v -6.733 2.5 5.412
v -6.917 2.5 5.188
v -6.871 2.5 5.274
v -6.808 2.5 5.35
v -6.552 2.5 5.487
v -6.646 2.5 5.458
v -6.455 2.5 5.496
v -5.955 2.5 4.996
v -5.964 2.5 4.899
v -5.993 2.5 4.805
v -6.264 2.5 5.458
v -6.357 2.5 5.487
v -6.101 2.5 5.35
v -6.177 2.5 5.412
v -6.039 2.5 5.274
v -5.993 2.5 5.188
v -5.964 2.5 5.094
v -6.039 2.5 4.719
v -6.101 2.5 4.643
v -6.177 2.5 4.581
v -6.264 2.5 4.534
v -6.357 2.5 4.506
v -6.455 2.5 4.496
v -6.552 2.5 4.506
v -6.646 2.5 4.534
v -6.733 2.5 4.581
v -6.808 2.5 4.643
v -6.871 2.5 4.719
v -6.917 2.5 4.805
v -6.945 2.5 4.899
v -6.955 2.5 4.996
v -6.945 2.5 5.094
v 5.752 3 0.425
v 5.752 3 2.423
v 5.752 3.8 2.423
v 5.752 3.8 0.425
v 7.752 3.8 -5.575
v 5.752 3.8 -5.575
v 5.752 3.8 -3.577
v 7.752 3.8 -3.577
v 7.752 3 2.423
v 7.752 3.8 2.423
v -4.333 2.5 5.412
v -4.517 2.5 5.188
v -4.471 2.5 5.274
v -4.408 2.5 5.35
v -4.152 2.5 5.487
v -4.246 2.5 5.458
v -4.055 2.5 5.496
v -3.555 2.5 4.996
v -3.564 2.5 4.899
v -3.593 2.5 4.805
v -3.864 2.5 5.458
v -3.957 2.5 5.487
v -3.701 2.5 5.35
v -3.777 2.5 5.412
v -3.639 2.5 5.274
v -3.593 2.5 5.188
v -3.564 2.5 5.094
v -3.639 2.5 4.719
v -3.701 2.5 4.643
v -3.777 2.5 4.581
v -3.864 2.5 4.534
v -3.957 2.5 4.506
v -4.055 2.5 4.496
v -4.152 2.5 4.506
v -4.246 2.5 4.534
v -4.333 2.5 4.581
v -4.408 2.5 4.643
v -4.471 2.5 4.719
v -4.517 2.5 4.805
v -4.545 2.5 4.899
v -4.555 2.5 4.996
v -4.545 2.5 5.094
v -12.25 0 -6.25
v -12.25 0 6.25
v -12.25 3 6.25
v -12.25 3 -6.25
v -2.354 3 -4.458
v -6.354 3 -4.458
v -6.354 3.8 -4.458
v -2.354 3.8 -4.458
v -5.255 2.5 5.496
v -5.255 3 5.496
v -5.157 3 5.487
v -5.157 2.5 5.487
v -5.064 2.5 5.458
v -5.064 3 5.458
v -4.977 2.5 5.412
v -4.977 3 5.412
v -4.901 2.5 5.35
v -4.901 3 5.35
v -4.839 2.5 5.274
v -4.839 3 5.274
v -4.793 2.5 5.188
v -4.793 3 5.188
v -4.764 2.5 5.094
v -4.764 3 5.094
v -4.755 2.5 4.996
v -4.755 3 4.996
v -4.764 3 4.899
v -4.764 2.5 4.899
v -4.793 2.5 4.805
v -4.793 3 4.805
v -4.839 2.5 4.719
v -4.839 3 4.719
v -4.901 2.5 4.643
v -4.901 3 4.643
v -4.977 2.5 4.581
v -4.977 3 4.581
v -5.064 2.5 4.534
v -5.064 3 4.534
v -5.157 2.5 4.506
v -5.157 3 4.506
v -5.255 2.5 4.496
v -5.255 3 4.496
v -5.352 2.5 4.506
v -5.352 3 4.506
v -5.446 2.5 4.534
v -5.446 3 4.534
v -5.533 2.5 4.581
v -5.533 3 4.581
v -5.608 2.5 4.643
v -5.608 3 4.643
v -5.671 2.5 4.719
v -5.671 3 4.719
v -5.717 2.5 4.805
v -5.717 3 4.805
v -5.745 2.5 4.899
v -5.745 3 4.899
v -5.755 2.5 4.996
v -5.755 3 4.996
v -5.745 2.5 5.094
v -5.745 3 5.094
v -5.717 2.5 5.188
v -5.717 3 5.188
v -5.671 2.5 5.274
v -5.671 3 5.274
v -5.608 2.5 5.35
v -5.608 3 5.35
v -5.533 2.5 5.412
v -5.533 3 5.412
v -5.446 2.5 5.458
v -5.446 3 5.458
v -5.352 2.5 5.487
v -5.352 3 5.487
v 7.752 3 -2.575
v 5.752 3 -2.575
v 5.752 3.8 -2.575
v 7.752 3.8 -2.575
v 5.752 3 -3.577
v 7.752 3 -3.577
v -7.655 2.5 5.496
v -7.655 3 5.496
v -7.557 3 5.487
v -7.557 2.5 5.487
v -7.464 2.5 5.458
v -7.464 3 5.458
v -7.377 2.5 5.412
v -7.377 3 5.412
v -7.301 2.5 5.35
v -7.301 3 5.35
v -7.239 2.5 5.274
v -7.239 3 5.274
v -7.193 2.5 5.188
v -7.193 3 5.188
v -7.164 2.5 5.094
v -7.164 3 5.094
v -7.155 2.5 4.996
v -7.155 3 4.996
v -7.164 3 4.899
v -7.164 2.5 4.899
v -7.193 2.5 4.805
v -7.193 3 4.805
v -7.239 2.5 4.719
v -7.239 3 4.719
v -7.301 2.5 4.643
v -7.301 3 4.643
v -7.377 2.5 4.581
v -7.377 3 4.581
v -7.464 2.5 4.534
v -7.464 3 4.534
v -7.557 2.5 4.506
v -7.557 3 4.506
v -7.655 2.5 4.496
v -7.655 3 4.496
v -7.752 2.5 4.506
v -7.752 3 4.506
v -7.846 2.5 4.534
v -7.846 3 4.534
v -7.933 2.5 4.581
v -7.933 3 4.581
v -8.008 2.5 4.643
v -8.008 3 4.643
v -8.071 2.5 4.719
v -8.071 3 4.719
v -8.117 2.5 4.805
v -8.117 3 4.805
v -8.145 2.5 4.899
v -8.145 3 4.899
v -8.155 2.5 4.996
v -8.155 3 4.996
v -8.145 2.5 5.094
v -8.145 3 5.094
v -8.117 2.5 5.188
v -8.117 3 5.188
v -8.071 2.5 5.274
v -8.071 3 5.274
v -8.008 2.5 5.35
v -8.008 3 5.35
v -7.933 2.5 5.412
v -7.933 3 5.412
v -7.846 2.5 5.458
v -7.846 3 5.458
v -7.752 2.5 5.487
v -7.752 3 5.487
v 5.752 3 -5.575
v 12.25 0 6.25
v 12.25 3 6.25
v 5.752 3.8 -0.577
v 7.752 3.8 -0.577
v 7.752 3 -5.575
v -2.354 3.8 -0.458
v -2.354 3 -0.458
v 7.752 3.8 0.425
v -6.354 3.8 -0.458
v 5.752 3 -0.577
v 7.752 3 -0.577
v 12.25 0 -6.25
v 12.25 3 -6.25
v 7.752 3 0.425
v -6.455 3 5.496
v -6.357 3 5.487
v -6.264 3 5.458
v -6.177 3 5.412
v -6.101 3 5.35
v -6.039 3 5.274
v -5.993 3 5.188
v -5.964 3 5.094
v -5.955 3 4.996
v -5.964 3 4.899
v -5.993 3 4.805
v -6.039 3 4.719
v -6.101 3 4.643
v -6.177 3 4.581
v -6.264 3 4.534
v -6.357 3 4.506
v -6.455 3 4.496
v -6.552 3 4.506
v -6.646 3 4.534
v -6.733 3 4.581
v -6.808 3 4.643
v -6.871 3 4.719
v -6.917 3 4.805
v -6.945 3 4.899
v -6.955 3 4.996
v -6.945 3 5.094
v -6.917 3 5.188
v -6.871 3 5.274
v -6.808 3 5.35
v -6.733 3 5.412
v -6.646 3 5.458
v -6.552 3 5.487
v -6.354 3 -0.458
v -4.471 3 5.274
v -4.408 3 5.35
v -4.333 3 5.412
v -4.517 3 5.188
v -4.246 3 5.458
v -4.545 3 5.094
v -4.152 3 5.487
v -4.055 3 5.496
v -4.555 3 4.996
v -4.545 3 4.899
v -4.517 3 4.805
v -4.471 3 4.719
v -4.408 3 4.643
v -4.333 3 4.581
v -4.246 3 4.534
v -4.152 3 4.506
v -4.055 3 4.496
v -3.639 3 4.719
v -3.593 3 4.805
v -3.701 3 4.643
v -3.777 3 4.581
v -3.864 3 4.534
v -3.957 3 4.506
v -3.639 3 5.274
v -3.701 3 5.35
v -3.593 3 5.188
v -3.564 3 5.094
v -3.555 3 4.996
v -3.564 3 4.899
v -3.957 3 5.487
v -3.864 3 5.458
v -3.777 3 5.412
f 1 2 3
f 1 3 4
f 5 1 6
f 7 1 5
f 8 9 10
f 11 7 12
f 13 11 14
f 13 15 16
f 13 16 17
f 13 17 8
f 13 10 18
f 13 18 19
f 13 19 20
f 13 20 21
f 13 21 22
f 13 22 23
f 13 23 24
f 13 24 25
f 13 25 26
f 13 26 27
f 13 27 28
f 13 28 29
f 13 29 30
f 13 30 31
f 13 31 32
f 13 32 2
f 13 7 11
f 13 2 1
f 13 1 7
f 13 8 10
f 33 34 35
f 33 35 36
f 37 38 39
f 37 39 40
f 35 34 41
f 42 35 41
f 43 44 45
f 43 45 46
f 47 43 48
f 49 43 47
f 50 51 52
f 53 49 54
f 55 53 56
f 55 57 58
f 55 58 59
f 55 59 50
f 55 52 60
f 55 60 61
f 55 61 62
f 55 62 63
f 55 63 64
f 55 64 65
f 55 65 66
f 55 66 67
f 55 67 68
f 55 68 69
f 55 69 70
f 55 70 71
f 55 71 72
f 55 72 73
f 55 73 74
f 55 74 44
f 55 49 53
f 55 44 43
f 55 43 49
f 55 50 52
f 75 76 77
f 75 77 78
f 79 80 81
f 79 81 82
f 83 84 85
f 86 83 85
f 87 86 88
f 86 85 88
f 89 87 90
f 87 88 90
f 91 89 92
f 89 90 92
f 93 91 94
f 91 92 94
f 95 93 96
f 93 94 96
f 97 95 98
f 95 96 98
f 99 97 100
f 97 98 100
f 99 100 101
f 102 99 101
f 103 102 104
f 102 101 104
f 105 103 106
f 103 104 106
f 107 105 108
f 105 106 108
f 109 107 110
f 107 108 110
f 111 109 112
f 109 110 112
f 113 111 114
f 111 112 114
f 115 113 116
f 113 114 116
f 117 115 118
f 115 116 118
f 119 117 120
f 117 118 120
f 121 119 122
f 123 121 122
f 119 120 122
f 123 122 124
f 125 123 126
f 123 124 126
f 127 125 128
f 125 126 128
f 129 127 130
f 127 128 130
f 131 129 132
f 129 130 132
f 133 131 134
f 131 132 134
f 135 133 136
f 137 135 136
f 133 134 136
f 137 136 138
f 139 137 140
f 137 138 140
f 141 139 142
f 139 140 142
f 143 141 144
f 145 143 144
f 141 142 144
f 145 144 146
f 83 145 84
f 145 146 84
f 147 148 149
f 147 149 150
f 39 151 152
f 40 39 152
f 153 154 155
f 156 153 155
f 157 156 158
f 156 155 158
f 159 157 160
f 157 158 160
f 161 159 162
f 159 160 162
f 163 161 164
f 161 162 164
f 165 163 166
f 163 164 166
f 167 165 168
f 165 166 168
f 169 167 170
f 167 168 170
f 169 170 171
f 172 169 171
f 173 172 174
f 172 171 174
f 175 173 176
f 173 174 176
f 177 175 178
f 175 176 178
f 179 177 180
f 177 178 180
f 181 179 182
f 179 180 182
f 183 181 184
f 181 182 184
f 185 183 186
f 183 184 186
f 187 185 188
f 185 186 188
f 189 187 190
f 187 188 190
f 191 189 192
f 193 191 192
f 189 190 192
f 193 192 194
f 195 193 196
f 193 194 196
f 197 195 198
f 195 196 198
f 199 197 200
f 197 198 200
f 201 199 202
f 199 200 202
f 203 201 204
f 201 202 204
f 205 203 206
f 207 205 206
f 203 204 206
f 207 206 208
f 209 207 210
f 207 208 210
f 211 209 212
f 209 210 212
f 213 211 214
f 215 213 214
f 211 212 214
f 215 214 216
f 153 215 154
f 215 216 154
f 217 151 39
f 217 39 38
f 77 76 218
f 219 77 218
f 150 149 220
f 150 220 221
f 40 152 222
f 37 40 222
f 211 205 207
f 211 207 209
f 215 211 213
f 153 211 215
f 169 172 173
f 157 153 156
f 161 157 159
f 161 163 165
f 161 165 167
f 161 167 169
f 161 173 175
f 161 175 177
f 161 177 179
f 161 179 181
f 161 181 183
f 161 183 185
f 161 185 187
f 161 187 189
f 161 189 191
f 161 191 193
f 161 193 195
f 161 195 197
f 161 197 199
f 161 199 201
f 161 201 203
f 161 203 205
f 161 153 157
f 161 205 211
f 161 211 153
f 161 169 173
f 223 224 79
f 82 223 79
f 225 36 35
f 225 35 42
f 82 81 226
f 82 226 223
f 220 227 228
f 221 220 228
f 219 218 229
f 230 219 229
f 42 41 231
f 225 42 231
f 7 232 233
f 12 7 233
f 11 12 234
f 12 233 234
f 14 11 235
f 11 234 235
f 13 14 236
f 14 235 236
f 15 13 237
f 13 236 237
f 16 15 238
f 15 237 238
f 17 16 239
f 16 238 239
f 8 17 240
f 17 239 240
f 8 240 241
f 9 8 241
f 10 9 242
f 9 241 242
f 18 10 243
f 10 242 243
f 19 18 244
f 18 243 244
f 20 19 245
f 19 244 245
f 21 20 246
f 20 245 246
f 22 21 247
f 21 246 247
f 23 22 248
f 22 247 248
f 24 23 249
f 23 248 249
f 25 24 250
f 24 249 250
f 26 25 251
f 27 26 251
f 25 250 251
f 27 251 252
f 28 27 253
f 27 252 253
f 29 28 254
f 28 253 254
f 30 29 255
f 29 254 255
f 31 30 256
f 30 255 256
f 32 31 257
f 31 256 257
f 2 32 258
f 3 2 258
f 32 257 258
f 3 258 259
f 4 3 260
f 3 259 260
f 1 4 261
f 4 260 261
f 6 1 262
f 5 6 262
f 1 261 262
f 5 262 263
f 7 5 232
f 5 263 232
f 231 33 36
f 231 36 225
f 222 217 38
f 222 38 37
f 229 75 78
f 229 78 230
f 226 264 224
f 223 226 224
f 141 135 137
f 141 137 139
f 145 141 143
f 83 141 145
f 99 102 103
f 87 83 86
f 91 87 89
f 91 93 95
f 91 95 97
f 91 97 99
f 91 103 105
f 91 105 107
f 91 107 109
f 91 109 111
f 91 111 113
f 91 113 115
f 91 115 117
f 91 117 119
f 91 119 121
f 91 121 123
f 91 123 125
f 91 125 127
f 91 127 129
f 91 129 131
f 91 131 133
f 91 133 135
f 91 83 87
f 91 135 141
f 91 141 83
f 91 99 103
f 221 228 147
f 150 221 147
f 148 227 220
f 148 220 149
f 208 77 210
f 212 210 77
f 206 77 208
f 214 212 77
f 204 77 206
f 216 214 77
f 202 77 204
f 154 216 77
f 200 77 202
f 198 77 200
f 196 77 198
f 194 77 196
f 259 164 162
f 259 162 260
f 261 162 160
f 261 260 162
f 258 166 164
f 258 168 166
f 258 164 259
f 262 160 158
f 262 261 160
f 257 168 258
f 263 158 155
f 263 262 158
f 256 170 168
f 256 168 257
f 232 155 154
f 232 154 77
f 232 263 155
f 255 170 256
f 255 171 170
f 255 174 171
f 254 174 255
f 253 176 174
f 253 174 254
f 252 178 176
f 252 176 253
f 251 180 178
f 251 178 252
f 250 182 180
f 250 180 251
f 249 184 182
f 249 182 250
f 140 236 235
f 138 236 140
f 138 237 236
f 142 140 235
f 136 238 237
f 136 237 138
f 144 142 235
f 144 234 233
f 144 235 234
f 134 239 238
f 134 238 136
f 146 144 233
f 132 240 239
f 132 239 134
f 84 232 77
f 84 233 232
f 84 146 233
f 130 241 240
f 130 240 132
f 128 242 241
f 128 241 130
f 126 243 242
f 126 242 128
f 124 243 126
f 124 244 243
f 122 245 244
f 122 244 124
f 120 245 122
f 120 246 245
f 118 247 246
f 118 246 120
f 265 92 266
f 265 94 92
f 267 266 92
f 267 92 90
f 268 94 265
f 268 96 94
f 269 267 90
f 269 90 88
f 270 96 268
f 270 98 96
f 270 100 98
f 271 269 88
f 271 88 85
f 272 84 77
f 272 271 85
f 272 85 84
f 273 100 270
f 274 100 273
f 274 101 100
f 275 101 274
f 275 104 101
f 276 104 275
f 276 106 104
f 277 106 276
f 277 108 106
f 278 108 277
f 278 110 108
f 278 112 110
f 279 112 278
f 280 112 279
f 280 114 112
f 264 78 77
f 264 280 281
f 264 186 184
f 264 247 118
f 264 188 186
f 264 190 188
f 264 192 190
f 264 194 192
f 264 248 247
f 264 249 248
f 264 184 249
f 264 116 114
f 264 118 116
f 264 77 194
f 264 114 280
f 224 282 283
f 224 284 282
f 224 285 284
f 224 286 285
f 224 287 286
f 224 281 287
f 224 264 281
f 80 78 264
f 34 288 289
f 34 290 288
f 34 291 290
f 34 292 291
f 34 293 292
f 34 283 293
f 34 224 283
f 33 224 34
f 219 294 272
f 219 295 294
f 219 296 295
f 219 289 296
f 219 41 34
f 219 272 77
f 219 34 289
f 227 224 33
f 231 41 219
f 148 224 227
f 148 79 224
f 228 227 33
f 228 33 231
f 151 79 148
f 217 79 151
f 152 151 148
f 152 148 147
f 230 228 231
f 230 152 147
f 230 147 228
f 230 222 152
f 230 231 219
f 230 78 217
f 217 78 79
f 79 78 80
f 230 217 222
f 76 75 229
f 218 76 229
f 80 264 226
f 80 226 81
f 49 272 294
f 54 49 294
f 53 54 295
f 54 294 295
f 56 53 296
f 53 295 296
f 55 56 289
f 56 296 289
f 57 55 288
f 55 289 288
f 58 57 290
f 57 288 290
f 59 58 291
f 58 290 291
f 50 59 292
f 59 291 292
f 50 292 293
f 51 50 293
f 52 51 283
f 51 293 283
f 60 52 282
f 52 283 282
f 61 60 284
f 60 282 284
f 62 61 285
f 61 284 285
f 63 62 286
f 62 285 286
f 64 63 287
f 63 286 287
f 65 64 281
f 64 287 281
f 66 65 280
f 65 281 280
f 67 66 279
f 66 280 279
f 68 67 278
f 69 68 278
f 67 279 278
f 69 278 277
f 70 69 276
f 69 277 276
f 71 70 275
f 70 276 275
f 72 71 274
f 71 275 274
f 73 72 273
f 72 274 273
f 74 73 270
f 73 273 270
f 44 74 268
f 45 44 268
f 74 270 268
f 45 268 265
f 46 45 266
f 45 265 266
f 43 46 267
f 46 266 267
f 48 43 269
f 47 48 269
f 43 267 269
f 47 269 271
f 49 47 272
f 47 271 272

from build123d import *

# Parameters (mm, degrees)
CROQUIS1_W              = 24.5
CROQUIS1_H              = 12.5
SALIENTE_EXTRUIR1_DEPTH = 3
CROQUIS2_R              = 0.5
CORTAR_EXTRUIR1_DEPTH   = 0.5
CROQUIS3_W              = 2
CROQUIS3_H              = 1.99806337
CROQUIS3_W_2            = 4
CROQUIS3_H_2            = 4
SALIENTE_EXTRUIR2_DEPTH = 0.8


with BuildPart() as part:
    # Croquis1 → Saliente-Extruir1 (new body)
    with BuildSketch(Plane(origin=(0, 0, 0), x_dir=(1, 0, 0), z_dir=(0, 1, 0))):
        Rectangle(CROQUIS1_W, CROQUIS1_H)
    extrude(amount=SALIENTE_EXTRUIR1_DEPTH)

    # Croquis2 → Cortar-Extruir1 (cut)
    with BuildSketch(Plane(origin=(0, 3, 0), x_dir=(1, 0, 0), z_dir=(0, 1, 0))):
        with Locations(Location((-7.654869521, -4.99629776, 0), (0, 0, 270))):
            Circle(CROQUIS2_R)
        with Locations(Location((-6.454869521, -4.99629776, 0), (0, 0, 270))):
            Circle(CROQUIS2_R)
        with Locations(Location((-5.254869521, -4.99629776, 0), (0, 0, 270))):
            Circle(CROQUIS2_R)
        with Locations(Location((-4.054869521, -4.99629776, 0), (0, 0, 270))):
            Circle(CROQUIS2_R)
    extrude(amount=-CORTAR_EXTRUIR1_DEPTH, mode=Mode.SUBTRACT)

    # Croquis3 → Saliente-Extruir2 (add)
    with BuildSketch(Plane(origin=(0, 3, 0), x_dir=(1, 0, 0), z_dir=(0, 1, 0))):
        with Locations((6.752485875, 1.575565117)):
            Rectangle(CROQUIS3_W, CROQUIS3_H)
        with Locations((-4.353841516, 2.457617945)):
            Rectangle(CROQUIS3_W_2, CROQUIS3_H_2)
        with Locations((6.752485875, 4.575565117)):
            Rectangle(CROQUIS3_W, CROQUIS3_H)
        with Locations((6.752485875, -1.424434883)):
            Rectangle(CROQUIS3_W, CROQUIS3_H)
    extrude(amount=SALIENTE_EXTRUIR2_DEPTH)


solid = part.part
